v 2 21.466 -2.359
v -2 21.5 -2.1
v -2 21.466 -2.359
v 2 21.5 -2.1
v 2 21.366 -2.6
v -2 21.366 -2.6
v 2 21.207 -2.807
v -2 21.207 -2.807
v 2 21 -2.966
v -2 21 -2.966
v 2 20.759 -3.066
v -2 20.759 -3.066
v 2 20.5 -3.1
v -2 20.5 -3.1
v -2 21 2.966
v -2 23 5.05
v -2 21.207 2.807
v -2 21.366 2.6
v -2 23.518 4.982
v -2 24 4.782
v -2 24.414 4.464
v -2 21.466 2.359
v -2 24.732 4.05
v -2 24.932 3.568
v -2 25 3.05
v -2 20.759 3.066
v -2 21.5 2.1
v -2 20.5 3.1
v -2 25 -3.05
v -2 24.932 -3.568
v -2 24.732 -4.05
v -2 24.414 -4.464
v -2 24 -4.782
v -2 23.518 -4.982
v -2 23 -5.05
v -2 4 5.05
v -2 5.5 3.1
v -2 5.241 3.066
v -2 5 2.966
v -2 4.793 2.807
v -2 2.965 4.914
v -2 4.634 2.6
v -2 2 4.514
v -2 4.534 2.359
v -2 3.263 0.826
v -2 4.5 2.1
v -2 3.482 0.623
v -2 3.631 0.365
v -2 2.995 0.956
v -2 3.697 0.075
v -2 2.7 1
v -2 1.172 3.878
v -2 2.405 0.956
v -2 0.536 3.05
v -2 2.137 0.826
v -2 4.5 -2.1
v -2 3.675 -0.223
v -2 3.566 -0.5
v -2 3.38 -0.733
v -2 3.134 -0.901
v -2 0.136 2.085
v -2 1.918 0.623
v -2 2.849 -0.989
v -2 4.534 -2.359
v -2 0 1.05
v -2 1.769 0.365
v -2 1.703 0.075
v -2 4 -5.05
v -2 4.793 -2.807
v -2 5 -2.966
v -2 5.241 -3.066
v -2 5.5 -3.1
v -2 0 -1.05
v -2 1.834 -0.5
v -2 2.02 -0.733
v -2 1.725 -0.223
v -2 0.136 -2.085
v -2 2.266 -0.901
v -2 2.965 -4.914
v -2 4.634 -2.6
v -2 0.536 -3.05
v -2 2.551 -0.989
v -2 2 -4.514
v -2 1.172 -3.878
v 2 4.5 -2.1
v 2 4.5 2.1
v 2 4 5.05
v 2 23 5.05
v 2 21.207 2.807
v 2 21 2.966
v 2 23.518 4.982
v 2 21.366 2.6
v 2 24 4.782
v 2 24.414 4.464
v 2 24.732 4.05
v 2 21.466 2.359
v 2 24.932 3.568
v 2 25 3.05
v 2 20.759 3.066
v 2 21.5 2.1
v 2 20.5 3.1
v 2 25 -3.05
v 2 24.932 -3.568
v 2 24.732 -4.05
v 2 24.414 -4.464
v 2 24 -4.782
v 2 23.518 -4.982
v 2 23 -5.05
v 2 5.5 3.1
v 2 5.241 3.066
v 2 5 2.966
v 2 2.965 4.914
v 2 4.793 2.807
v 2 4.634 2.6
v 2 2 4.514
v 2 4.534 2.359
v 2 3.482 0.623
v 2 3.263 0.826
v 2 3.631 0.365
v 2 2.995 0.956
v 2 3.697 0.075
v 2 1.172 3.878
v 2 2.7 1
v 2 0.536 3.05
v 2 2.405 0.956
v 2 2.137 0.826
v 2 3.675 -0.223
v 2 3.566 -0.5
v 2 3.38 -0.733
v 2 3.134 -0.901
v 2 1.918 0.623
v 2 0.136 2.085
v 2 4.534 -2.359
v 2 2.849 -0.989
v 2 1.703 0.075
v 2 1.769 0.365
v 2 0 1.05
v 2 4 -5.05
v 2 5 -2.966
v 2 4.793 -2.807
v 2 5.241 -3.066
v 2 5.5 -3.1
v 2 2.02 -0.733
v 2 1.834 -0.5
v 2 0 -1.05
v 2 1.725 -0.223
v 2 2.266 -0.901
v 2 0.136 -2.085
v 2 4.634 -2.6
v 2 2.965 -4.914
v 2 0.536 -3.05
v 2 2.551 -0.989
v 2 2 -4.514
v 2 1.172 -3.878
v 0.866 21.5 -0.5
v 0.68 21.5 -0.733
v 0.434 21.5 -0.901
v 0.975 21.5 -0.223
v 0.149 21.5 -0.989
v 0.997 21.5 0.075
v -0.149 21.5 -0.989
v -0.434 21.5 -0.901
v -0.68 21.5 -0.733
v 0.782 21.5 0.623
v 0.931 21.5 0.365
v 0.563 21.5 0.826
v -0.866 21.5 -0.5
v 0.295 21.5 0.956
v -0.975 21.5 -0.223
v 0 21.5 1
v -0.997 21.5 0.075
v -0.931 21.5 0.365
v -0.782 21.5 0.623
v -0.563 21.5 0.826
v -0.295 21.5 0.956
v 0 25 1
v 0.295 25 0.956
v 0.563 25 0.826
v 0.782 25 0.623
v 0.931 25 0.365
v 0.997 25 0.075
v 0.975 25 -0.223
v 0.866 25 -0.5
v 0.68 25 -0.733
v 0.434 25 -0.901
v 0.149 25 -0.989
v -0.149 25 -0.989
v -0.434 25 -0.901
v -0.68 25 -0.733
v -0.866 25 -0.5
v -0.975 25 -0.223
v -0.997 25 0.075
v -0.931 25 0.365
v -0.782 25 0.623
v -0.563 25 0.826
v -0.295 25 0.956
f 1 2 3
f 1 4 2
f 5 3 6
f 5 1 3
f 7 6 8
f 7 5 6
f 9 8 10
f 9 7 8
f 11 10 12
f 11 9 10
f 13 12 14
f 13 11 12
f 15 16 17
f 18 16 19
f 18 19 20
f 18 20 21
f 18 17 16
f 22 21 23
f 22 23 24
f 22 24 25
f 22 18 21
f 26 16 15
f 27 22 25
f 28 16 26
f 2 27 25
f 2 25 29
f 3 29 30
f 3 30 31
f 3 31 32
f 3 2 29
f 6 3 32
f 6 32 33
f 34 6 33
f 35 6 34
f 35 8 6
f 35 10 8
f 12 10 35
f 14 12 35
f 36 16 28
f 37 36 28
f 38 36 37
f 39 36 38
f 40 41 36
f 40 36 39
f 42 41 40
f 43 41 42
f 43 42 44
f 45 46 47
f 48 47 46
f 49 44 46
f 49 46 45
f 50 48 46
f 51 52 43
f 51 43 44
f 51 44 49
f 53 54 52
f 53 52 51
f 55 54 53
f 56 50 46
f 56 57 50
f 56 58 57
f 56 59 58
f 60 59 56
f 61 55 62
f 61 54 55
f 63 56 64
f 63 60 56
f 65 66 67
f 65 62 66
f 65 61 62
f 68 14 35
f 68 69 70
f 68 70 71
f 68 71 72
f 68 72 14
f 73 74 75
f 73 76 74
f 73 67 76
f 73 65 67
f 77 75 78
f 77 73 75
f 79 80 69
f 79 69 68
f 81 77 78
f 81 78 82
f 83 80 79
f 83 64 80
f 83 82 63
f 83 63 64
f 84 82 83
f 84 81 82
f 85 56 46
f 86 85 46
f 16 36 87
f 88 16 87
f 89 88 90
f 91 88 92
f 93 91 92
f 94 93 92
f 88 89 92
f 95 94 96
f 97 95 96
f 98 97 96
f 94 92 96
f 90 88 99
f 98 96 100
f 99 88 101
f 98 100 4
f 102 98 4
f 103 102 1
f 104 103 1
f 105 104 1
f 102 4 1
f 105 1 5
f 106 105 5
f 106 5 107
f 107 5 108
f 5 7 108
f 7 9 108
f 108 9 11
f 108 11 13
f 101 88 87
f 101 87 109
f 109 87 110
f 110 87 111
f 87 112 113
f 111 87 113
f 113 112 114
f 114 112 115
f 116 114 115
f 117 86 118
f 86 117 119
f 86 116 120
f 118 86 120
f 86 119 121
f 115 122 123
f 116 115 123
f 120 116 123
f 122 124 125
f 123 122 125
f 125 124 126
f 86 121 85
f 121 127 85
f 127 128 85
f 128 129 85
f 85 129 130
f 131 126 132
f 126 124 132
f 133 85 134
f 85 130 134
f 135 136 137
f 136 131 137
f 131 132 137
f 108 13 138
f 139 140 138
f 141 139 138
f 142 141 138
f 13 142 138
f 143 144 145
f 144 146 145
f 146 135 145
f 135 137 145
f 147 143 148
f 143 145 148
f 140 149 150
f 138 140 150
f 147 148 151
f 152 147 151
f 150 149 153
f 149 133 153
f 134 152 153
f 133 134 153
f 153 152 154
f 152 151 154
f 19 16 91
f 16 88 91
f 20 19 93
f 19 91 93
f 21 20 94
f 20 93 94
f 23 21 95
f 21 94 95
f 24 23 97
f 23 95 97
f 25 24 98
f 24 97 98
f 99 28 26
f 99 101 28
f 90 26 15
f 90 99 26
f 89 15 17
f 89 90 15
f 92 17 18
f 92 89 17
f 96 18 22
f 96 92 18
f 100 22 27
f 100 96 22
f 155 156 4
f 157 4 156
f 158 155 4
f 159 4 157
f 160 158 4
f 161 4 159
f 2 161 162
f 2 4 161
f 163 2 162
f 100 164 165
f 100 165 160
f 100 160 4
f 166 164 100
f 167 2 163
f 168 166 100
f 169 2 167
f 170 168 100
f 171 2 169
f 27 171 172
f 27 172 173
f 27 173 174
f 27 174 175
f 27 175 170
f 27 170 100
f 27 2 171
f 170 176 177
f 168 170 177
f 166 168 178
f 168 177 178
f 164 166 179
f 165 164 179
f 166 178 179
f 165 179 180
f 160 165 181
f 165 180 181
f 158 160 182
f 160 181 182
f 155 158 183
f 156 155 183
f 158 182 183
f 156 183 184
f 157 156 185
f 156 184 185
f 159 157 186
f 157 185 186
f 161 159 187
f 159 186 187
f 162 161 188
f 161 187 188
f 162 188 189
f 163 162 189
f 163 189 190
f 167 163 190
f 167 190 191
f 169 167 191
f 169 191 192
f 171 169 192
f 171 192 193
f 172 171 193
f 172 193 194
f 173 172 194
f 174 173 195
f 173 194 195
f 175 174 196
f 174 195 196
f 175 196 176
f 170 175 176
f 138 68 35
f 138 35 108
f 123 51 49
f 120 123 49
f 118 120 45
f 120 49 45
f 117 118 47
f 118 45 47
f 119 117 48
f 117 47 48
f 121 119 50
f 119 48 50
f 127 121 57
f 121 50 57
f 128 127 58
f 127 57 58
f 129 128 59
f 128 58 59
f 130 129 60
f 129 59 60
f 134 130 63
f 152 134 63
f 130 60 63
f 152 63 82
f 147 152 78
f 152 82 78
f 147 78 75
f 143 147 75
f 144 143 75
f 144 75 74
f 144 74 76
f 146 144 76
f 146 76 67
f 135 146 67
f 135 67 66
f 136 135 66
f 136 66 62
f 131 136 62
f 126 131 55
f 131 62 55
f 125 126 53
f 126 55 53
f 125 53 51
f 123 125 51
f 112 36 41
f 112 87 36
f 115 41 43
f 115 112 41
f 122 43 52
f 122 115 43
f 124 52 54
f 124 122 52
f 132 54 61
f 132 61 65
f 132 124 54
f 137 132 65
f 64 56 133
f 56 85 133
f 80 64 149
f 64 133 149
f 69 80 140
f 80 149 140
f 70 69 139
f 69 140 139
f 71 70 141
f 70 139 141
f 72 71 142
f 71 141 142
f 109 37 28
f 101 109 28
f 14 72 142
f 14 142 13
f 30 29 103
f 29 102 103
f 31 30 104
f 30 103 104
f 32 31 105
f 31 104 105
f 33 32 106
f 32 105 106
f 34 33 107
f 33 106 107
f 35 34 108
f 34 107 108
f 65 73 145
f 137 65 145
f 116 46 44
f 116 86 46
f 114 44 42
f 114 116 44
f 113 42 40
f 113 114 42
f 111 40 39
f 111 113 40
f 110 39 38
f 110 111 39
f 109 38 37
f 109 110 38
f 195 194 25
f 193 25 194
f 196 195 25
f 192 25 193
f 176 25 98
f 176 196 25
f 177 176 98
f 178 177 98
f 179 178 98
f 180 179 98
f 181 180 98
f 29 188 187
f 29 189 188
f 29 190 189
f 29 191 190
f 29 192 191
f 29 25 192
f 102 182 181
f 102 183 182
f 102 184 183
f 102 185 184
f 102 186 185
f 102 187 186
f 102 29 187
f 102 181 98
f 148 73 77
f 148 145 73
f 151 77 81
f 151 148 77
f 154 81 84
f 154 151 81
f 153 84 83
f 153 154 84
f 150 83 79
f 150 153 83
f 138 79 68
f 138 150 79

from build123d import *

# Parameters (mm, degrees)
SKETCH21_W          = 4
SKETCH21_H          = 10.1
BOSS_EXTRUDE1_DEPTH = 25
SKETCH22_R          = 1
CUT_EXTRUDE4_DEPTH  = 4
SKETCH23_W          = 6.2
SKETCH23_H          = 17
CUT_EXTRUDE5_DEPTH  = 4
SKETCH24_R          = 1
CUT_EXTRUDE6_DEPTH  = 3.5
FILLET4_R           = 4
FILLET5_R           = 2
FILLET6_R           = 1


with BuildPart() as part:
    # Sketch21 → Boss-Extrude1 (new body)
    with BuildSketch(Plane(origin=(0, 0, 0), x_dir=(1, 0, 0), z_dir=(0, 1, 0))):
        Rectangle(SKETCH21_W, SKETCH21_H)
    extrude(amount=BOSS_EXTRUDE1_DEPTH)

    # Sketch22 → Cut-Extrude4 (cut)
    with BuildSketch(Plane.ZY.offset(2)):
        with Locations((0, 2.7)):
            Circle(SKETCH22_R)
    extrude(amount=-CUT_EXTRUDE4_DEPTH, mode=Mode.SUBTRACT)

    # Sketch23 → Cut-Extrude5 (cut)
    with BuildSketch(Plane.ZY.offset(2)):
        with Locations((0, 13)):
            Rectangle(SKETCH23_W, SKETCH23_H)
    extrude(amount=-CUT_EXTRUDE5_DEPTH, mode=Mode.SUBTRACT)

    # Sketch24 → Cut-Extrude6 (cut)
    with BuildSketch(Plane(origin=(0, 25, 0), x_dir=(1, 0, 0), z_dir=(0, 1, 0))):
        with Locations(Location((0, 0, 0), (0, 0, 270))):
            Circle(SKETCH24_R)
    extrude(amount=-CUT_EXTRUDE6_DEPTH, mode=Mode.SUBTRACT)

    # Fillet4
    fillet4_edges = [part.edges().sort_by_distance(p)[0] for p in [
        (0, 0, 5.05),
        (0, 0, -5.05),
    ]]
    fillet(fillet4_edges, radius=FILLET4_R)

    # Fillet5
    fillet5_edges = [part.edges().sort_by_distance(p)[0] for p in [
        (0, 25, 5.05),
        (0, 25, -5.05),
    ]]
    fillet(fillet5_edges, radius=FILLET5_R)

    # Fillet6
    fillet6_edges = [part.edges().sort_by_distance(p)[0] for p in [
        (0, 21.5, 3.1),
        (0, 4.5, 3.1),
        (0, 4.5, -3.1),
        (0, 21.5, -3.1),
    ]]
    fillet(fillet6_edges, radius=FILLET6_R)


solid = part.part
